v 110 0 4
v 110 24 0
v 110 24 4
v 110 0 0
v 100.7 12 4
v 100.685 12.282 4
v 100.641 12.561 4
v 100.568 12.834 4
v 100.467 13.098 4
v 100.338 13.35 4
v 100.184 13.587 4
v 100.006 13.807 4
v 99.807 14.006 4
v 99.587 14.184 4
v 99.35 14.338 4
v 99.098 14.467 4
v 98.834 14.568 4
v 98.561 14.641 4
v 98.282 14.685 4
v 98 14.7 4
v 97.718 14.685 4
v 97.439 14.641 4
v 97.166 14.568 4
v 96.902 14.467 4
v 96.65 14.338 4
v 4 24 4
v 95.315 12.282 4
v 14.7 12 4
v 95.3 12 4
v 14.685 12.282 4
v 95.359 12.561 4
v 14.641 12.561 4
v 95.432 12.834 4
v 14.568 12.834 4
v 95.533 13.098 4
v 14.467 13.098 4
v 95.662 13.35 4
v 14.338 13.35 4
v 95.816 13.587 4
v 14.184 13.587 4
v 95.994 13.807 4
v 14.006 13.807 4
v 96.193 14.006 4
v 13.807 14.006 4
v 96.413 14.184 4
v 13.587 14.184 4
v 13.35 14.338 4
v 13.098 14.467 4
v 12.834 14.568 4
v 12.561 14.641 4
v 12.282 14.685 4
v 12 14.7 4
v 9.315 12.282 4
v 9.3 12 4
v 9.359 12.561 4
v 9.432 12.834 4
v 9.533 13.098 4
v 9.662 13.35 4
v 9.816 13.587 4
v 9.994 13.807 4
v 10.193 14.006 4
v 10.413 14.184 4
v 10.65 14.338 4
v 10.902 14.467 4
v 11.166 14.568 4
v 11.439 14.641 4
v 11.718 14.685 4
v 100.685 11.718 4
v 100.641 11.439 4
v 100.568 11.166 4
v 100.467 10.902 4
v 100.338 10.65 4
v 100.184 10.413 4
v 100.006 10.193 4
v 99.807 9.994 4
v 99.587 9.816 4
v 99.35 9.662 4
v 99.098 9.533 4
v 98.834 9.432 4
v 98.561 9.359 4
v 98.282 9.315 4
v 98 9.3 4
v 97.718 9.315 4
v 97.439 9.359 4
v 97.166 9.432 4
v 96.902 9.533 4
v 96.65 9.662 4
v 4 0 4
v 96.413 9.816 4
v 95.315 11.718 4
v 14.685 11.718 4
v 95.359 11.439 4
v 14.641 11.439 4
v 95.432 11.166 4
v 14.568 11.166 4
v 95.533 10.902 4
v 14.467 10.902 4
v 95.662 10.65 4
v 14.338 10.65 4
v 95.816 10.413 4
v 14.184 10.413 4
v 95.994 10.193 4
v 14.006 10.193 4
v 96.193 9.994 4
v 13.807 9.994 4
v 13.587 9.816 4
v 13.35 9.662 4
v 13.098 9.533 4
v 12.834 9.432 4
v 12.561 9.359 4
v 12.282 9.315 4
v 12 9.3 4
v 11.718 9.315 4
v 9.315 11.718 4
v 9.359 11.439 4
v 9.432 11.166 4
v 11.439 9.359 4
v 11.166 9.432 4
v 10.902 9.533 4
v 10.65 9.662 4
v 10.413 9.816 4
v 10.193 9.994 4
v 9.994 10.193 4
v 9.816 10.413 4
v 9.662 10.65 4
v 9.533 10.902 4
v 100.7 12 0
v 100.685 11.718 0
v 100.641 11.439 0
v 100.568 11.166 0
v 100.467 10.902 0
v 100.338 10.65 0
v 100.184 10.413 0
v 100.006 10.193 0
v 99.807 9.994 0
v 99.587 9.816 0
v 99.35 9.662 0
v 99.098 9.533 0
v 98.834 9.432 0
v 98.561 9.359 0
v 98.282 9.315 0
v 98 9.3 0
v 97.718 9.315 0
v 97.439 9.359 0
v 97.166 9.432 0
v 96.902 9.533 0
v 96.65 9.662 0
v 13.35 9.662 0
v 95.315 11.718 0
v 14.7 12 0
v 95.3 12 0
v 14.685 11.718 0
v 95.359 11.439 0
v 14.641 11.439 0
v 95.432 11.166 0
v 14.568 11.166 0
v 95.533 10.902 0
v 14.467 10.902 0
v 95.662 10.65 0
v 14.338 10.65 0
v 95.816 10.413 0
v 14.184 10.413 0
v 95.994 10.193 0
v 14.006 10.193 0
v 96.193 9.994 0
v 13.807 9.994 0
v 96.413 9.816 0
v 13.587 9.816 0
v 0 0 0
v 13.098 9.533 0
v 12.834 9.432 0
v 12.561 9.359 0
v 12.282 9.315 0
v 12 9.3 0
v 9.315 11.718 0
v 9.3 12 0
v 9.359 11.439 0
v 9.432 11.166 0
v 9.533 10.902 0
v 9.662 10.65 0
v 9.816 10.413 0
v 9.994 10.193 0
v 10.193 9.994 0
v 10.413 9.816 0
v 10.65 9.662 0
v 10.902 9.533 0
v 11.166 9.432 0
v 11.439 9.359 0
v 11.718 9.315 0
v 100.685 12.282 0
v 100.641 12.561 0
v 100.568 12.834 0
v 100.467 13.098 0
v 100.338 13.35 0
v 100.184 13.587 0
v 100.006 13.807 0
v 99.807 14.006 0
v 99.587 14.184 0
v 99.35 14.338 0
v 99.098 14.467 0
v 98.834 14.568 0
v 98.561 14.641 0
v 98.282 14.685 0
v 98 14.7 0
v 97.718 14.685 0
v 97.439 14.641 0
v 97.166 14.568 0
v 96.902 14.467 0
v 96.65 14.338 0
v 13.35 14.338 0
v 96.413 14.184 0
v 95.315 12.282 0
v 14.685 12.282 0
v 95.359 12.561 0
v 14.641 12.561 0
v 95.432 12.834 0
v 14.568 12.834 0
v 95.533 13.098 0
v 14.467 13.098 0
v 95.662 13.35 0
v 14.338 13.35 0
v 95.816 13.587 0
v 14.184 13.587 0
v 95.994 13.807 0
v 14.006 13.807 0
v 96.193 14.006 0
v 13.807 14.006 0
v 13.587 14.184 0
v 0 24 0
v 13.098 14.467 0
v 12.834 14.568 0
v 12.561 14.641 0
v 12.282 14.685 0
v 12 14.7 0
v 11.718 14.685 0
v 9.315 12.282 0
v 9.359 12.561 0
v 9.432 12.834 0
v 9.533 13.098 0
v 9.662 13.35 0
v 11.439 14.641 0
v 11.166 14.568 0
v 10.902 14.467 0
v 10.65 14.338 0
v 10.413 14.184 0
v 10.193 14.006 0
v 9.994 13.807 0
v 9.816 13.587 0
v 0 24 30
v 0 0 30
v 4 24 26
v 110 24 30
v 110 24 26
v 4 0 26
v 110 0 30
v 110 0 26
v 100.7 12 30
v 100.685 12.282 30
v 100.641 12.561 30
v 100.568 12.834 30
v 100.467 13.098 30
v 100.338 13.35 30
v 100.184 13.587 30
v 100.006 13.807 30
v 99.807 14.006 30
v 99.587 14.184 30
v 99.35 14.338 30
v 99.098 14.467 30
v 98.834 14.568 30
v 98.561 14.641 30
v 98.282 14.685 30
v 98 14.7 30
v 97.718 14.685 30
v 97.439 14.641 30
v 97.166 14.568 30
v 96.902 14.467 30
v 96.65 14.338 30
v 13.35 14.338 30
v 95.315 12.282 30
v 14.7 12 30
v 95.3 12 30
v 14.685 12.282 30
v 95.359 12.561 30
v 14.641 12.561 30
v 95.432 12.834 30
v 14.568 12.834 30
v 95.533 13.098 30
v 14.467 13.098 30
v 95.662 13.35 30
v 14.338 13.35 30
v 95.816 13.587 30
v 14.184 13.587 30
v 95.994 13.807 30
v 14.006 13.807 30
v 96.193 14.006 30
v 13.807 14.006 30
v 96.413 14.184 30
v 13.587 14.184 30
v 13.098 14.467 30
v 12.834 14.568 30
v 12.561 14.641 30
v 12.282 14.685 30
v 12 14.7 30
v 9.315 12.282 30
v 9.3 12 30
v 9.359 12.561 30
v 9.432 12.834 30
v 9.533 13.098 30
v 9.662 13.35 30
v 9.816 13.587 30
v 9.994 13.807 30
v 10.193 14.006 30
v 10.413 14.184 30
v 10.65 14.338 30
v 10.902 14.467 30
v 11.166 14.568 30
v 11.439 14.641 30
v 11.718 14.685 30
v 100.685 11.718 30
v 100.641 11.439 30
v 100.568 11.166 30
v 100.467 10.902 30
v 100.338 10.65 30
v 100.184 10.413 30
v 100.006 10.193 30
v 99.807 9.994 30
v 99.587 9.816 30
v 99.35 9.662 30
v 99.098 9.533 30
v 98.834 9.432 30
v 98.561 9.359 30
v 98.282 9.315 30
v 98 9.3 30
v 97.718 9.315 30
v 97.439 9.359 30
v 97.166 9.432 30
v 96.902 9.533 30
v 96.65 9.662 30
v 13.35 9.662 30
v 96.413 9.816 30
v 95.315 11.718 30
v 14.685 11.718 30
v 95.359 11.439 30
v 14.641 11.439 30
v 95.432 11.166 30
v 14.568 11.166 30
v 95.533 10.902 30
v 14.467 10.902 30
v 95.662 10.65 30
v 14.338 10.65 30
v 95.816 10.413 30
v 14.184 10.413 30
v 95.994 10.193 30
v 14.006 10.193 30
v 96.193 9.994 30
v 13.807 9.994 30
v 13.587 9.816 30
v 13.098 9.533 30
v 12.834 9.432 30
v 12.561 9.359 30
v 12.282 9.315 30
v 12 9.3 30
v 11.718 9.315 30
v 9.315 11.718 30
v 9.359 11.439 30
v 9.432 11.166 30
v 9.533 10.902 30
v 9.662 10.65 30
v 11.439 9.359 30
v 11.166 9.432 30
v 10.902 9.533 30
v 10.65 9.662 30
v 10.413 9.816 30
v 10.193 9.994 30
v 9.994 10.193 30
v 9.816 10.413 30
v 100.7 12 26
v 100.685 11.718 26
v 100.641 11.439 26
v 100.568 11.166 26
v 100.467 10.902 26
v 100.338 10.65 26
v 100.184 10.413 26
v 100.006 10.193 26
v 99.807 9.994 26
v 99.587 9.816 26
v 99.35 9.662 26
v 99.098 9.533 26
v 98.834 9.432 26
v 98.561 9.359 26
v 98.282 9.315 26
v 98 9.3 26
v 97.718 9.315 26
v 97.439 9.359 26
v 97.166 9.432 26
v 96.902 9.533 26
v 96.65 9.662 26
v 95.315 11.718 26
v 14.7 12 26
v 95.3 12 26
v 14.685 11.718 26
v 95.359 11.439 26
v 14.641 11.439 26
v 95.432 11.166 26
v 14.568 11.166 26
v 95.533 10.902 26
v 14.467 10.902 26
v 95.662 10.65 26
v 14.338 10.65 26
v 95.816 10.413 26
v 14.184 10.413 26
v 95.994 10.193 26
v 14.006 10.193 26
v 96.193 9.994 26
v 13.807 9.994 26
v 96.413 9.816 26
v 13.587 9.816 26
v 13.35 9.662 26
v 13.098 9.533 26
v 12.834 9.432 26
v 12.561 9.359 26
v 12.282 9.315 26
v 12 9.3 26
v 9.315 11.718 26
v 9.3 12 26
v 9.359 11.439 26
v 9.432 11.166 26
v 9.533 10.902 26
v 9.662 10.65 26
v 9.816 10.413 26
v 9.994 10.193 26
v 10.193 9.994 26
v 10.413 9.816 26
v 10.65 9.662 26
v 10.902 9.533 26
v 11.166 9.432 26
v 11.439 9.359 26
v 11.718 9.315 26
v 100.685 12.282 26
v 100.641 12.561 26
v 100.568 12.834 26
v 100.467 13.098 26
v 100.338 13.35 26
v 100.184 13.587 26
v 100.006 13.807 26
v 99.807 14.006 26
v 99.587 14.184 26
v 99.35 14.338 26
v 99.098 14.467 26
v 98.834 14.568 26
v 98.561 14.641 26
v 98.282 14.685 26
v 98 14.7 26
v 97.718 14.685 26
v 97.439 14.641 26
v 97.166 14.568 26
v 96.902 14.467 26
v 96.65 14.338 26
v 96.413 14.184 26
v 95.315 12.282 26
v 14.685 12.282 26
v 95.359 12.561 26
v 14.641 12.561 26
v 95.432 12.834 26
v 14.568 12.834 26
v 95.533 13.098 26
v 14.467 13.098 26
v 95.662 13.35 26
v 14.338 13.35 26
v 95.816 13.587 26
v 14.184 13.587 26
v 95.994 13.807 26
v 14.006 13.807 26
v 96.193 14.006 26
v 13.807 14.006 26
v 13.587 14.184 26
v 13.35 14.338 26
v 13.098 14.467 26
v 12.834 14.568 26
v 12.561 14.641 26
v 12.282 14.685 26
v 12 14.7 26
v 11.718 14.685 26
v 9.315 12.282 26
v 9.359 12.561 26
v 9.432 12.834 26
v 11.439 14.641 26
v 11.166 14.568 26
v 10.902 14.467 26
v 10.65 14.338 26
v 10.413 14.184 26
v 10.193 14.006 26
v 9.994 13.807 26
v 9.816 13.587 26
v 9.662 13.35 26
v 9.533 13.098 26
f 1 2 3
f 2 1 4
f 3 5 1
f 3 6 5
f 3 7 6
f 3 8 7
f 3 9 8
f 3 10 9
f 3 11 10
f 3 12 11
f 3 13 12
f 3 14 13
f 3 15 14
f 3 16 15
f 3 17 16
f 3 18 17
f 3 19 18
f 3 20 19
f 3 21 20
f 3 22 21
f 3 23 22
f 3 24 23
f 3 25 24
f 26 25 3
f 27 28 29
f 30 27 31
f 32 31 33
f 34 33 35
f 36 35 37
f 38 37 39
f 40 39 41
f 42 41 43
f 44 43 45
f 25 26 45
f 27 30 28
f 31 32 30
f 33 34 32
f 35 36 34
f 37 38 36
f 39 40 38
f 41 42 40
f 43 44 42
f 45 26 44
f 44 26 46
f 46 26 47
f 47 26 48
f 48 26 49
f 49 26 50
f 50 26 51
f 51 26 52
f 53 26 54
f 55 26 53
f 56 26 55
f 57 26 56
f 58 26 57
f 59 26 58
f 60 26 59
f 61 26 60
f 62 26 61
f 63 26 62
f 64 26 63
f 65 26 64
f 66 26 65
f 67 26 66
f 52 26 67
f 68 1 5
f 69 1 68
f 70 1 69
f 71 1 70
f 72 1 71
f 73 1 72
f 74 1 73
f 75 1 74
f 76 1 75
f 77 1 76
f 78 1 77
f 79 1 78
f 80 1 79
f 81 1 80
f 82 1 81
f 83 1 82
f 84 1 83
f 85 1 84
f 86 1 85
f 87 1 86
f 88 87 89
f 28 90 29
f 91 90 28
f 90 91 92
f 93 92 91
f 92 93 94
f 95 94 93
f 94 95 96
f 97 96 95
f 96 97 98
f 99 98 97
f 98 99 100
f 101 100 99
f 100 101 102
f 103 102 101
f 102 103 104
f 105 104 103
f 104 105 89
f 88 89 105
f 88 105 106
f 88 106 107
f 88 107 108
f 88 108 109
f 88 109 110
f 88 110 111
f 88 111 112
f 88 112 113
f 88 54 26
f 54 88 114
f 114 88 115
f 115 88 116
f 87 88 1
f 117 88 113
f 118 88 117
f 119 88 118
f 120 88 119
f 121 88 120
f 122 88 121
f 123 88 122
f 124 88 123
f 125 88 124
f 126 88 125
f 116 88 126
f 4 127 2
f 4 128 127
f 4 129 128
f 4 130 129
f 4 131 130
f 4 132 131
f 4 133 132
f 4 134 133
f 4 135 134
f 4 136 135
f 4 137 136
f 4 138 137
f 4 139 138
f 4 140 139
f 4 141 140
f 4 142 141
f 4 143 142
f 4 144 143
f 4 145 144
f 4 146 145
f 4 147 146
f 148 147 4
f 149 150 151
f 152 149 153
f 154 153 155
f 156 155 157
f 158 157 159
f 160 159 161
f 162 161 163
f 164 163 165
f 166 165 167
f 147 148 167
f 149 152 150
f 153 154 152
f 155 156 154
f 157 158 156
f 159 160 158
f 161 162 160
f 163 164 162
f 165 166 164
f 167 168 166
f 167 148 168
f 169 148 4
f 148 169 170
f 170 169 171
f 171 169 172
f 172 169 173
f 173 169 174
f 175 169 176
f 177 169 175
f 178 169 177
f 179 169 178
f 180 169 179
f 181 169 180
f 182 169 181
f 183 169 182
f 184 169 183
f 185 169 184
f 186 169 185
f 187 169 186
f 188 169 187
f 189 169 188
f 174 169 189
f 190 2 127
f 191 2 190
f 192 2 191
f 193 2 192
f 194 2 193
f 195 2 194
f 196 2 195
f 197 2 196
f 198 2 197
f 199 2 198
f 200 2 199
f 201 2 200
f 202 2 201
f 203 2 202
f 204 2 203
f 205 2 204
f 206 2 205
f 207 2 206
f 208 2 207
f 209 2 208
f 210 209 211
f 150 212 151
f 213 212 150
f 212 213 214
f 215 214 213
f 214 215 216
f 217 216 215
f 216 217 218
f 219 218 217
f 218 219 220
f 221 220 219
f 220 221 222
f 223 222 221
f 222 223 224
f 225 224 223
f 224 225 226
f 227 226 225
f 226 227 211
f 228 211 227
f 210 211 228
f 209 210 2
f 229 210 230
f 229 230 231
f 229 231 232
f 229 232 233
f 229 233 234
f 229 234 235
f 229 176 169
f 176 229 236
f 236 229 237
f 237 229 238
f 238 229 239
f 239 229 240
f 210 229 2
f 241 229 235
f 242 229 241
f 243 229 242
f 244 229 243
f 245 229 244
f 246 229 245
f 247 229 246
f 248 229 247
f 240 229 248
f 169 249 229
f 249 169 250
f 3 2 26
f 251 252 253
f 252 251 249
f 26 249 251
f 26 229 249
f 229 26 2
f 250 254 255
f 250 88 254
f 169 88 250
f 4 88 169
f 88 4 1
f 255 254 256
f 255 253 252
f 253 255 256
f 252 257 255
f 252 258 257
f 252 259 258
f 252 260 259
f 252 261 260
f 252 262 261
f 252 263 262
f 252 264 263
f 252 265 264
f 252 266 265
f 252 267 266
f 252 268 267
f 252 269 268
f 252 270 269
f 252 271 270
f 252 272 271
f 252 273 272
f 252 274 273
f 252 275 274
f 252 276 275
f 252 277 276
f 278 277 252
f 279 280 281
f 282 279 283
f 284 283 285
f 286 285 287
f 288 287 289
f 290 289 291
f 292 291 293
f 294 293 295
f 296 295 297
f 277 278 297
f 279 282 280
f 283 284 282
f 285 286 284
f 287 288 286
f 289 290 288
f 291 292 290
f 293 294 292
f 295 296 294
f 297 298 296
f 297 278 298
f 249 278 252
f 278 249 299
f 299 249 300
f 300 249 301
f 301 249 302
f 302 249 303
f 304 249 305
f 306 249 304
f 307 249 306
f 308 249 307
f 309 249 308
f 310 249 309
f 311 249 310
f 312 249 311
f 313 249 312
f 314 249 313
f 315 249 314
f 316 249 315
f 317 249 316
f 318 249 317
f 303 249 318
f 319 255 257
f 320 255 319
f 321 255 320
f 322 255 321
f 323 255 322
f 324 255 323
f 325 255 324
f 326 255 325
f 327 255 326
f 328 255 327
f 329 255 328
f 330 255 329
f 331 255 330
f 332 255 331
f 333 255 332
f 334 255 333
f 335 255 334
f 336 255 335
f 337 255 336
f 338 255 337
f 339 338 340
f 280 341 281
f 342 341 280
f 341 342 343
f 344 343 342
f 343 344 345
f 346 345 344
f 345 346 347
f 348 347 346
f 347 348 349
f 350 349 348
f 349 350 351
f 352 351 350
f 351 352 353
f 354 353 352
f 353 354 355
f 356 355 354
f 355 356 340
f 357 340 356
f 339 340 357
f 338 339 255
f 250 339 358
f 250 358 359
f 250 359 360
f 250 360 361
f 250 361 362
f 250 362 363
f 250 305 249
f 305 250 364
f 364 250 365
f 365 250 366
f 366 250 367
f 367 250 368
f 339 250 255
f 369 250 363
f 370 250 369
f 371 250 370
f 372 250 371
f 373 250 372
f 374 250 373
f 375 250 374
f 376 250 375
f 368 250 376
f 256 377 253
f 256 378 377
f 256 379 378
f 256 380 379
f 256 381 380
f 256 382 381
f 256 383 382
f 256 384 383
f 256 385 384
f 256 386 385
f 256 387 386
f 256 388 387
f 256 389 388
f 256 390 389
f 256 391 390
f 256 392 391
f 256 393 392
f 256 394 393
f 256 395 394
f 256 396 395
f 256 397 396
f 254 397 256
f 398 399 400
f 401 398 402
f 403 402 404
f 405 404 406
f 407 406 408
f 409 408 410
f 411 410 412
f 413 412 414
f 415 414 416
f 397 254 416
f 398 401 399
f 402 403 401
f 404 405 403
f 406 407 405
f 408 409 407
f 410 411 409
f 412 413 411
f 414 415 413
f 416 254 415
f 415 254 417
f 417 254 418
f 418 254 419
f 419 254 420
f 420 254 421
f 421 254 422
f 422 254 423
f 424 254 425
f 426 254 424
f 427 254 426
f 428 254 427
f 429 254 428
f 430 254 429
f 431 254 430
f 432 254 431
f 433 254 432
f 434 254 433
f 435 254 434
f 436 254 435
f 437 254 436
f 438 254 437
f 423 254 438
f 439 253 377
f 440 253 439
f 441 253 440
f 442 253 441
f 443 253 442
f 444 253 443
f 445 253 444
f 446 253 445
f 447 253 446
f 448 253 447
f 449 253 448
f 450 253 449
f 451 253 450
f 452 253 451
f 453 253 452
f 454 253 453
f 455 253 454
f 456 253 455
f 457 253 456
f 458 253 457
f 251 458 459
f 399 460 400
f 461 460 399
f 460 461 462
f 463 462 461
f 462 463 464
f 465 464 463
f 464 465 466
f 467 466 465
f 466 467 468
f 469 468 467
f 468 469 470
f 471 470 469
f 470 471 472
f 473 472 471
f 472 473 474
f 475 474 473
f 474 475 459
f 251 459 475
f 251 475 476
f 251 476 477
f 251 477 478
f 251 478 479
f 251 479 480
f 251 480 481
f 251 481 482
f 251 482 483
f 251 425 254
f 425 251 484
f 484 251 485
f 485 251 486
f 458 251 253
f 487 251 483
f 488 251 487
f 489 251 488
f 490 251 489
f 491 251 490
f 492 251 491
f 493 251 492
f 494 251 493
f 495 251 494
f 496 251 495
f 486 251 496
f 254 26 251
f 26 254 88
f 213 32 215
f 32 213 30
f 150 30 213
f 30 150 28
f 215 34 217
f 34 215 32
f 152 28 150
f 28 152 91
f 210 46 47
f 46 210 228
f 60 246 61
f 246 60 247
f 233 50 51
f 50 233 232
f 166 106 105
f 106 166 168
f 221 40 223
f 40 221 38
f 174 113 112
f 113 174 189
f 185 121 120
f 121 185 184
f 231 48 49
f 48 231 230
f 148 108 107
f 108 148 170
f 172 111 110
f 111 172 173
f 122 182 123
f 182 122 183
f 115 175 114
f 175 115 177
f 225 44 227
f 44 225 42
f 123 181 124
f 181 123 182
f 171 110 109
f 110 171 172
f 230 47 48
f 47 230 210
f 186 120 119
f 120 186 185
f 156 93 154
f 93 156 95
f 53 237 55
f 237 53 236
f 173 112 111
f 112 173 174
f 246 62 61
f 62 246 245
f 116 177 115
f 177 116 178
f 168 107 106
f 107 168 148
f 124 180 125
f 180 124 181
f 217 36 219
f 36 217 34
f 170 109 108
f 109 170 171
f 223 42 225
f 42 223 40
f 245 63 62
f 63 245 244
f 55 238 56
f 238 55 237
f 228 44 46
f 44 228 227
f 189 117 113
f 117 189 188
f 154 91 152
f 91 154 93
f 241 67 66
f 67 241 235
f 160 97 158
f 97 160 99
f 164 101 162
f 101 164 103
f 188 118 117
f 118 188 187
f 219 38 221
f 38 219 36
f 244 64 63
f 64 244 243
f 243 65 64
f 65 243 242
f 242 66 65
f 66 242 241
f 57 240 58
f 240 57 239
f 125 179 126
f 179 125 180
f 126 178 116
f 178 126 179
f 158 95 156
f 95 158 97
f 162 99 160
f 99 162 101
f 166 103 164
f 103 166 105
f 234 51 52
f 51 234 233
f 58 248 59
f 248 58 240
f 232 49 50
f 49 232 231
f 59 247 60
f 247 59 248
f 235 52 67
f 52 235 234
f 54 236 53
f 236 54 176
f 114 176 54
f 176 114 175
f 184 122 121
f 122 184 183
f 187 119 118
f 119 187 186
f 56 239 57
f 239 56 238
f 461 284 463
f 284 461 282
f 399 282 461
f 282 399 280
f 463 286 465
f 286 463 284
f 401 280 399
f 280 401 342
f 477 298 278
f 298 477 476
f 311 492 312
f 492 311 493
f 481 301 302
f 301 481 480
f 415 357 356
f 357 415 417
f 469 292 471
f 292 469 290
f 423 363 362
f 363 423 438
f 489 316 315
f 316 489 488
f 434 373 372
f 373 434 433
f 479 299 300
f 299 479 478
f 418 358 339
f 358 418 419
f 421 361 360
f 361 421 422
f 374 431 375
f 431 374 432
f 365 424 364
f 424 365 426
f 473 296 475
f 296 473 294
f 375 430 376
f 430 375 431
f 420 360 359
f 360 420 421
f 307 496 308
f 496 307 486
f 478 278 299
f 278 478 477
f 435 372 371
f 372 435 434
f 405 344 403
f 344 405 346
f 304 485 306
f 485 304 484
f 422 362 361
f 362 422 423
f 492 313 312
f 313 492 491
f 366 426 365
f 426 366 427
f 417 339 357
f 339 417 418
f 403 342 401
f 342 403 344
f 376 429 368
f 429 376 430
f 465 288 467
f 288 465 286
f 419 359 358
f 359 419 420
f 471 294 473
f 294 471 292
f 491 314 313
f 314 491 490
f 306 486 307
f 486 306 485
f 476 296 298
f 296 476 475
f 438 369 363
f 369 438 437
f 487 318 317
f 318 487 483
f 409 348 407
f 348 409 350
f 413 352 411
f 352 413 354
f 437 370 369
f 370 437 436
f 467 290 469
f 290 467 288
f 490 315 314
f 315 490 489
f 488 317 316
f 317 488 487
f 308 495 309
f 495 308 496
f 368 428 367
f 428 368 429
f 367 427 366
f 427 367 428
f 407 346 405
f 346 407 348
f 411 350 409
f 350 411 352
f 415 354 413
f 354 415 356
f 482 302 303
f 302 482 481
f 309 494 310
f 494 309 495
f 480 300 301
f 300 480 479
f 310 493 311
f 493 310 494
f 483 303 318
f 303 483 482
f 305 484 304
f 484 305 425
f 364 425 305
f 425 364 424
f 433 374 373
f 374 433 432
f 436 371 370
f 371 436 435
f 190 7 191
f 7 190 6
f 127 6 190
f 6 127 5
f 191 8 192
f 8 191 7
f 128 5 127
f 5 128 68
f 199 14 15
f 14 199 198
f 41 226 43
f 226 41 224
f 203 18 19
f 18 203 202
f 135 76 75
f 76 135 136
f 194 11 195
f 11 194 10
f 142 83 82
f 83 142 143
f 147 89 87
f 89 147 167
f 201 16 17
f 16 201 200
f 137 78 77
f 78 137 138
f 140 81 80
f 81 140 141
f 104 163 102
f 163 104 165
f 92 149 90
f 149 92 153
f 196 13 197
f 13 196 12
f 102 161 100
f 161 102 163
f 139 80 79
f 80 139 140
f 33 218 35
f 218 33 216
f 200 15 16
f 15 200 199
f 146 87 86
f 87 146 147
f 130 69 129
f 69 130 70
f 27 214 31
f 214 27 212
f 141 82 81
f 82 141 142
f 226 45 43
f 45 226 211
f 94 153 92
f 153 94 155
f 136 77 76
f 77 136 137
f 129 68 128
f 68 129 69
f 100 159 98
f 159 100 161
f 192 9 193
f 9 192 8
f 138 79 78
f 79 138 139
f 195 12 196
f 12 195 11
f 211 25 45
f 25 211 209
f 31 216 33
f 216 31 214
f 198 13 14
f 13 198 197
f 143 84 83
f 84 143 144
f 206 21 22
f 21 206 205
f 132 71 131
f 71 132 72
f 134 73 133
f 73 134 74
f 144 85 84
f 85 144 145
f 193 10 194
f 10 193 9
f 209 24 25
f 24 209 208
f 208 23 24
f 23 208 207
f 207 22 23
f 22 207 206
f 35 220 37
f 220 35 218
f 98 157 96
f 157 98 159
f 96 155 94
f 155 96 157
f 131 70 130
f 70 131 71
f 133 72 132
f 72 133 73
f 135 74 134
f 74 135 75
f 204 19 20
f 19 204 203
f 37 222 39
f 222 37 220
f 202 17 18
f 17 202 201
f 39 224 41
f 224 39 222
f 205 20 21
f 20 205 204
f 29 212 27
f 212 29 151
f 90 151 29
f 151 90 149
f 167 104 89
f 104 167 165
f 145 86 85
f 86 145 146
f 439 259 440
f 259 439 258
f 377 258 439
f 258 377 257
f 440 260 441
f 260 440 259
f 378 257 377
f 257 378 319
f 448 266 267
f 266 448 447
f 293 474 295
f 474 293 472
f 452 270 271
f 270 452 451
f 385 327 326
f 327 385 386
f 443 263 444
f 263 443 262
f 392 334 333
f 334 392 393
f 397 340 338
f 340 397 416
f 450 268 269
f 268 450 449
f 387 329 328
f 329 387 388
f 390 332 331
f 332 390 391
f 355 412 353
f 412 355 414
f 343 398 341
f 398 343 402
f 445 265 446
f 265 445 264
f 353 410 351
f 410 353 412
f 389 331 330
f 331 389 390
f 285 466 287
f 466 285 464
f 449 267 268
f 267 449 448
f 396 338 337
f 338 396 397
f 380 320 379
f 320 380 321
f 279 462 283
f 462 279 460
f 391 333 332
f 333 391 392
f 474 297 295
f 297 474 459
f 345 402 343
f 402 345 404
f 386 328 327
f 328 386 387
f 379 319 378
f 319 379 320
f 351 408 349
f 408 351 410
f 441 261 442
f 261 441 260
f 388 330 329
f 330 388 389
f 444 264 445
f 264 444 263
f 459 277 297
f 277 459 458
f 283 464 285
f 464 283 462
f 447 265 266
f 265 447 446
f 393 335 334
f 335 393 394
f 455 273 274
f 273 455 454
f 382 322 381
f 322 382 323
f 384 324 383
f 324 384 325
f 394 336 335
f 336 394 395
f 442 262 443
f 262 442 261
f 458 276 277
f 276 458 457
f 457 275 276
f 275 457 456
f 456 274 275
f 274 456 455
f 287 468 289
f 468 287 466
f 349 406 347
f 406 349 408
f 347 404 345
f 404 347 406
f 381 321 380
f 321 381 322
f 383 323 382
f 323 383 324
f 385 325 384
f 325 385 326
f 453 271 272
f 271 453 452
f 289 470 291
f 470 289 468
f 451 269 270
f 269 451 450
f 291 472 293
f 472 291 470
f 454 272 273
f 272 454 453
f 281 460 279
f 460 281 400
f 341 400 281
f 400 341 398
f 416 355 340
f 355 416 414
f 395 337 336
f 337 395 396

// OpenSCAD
// Z-offset mounting bracket.
$fn = 60;
eps = 0.02;
length = 110;
height = 26;
width = 24;
thickness = 4;
difference() {
    union() {
        cube([length,width,thickness]);
        translate([0,0,height]) cube([length,width,thickness]);
        translate([0,0,thickness]) cube([thickness,width,height-thickness]);
    }
    for (x=[12,length-12]) {
        translate([x,width/2,-eps]) cylinder(d=5.4,h=thickness+2*eps);
        translate([x,width/2,height-eps]) cylinder(d=5.4,h=thickness+2*eps);
    }
}
